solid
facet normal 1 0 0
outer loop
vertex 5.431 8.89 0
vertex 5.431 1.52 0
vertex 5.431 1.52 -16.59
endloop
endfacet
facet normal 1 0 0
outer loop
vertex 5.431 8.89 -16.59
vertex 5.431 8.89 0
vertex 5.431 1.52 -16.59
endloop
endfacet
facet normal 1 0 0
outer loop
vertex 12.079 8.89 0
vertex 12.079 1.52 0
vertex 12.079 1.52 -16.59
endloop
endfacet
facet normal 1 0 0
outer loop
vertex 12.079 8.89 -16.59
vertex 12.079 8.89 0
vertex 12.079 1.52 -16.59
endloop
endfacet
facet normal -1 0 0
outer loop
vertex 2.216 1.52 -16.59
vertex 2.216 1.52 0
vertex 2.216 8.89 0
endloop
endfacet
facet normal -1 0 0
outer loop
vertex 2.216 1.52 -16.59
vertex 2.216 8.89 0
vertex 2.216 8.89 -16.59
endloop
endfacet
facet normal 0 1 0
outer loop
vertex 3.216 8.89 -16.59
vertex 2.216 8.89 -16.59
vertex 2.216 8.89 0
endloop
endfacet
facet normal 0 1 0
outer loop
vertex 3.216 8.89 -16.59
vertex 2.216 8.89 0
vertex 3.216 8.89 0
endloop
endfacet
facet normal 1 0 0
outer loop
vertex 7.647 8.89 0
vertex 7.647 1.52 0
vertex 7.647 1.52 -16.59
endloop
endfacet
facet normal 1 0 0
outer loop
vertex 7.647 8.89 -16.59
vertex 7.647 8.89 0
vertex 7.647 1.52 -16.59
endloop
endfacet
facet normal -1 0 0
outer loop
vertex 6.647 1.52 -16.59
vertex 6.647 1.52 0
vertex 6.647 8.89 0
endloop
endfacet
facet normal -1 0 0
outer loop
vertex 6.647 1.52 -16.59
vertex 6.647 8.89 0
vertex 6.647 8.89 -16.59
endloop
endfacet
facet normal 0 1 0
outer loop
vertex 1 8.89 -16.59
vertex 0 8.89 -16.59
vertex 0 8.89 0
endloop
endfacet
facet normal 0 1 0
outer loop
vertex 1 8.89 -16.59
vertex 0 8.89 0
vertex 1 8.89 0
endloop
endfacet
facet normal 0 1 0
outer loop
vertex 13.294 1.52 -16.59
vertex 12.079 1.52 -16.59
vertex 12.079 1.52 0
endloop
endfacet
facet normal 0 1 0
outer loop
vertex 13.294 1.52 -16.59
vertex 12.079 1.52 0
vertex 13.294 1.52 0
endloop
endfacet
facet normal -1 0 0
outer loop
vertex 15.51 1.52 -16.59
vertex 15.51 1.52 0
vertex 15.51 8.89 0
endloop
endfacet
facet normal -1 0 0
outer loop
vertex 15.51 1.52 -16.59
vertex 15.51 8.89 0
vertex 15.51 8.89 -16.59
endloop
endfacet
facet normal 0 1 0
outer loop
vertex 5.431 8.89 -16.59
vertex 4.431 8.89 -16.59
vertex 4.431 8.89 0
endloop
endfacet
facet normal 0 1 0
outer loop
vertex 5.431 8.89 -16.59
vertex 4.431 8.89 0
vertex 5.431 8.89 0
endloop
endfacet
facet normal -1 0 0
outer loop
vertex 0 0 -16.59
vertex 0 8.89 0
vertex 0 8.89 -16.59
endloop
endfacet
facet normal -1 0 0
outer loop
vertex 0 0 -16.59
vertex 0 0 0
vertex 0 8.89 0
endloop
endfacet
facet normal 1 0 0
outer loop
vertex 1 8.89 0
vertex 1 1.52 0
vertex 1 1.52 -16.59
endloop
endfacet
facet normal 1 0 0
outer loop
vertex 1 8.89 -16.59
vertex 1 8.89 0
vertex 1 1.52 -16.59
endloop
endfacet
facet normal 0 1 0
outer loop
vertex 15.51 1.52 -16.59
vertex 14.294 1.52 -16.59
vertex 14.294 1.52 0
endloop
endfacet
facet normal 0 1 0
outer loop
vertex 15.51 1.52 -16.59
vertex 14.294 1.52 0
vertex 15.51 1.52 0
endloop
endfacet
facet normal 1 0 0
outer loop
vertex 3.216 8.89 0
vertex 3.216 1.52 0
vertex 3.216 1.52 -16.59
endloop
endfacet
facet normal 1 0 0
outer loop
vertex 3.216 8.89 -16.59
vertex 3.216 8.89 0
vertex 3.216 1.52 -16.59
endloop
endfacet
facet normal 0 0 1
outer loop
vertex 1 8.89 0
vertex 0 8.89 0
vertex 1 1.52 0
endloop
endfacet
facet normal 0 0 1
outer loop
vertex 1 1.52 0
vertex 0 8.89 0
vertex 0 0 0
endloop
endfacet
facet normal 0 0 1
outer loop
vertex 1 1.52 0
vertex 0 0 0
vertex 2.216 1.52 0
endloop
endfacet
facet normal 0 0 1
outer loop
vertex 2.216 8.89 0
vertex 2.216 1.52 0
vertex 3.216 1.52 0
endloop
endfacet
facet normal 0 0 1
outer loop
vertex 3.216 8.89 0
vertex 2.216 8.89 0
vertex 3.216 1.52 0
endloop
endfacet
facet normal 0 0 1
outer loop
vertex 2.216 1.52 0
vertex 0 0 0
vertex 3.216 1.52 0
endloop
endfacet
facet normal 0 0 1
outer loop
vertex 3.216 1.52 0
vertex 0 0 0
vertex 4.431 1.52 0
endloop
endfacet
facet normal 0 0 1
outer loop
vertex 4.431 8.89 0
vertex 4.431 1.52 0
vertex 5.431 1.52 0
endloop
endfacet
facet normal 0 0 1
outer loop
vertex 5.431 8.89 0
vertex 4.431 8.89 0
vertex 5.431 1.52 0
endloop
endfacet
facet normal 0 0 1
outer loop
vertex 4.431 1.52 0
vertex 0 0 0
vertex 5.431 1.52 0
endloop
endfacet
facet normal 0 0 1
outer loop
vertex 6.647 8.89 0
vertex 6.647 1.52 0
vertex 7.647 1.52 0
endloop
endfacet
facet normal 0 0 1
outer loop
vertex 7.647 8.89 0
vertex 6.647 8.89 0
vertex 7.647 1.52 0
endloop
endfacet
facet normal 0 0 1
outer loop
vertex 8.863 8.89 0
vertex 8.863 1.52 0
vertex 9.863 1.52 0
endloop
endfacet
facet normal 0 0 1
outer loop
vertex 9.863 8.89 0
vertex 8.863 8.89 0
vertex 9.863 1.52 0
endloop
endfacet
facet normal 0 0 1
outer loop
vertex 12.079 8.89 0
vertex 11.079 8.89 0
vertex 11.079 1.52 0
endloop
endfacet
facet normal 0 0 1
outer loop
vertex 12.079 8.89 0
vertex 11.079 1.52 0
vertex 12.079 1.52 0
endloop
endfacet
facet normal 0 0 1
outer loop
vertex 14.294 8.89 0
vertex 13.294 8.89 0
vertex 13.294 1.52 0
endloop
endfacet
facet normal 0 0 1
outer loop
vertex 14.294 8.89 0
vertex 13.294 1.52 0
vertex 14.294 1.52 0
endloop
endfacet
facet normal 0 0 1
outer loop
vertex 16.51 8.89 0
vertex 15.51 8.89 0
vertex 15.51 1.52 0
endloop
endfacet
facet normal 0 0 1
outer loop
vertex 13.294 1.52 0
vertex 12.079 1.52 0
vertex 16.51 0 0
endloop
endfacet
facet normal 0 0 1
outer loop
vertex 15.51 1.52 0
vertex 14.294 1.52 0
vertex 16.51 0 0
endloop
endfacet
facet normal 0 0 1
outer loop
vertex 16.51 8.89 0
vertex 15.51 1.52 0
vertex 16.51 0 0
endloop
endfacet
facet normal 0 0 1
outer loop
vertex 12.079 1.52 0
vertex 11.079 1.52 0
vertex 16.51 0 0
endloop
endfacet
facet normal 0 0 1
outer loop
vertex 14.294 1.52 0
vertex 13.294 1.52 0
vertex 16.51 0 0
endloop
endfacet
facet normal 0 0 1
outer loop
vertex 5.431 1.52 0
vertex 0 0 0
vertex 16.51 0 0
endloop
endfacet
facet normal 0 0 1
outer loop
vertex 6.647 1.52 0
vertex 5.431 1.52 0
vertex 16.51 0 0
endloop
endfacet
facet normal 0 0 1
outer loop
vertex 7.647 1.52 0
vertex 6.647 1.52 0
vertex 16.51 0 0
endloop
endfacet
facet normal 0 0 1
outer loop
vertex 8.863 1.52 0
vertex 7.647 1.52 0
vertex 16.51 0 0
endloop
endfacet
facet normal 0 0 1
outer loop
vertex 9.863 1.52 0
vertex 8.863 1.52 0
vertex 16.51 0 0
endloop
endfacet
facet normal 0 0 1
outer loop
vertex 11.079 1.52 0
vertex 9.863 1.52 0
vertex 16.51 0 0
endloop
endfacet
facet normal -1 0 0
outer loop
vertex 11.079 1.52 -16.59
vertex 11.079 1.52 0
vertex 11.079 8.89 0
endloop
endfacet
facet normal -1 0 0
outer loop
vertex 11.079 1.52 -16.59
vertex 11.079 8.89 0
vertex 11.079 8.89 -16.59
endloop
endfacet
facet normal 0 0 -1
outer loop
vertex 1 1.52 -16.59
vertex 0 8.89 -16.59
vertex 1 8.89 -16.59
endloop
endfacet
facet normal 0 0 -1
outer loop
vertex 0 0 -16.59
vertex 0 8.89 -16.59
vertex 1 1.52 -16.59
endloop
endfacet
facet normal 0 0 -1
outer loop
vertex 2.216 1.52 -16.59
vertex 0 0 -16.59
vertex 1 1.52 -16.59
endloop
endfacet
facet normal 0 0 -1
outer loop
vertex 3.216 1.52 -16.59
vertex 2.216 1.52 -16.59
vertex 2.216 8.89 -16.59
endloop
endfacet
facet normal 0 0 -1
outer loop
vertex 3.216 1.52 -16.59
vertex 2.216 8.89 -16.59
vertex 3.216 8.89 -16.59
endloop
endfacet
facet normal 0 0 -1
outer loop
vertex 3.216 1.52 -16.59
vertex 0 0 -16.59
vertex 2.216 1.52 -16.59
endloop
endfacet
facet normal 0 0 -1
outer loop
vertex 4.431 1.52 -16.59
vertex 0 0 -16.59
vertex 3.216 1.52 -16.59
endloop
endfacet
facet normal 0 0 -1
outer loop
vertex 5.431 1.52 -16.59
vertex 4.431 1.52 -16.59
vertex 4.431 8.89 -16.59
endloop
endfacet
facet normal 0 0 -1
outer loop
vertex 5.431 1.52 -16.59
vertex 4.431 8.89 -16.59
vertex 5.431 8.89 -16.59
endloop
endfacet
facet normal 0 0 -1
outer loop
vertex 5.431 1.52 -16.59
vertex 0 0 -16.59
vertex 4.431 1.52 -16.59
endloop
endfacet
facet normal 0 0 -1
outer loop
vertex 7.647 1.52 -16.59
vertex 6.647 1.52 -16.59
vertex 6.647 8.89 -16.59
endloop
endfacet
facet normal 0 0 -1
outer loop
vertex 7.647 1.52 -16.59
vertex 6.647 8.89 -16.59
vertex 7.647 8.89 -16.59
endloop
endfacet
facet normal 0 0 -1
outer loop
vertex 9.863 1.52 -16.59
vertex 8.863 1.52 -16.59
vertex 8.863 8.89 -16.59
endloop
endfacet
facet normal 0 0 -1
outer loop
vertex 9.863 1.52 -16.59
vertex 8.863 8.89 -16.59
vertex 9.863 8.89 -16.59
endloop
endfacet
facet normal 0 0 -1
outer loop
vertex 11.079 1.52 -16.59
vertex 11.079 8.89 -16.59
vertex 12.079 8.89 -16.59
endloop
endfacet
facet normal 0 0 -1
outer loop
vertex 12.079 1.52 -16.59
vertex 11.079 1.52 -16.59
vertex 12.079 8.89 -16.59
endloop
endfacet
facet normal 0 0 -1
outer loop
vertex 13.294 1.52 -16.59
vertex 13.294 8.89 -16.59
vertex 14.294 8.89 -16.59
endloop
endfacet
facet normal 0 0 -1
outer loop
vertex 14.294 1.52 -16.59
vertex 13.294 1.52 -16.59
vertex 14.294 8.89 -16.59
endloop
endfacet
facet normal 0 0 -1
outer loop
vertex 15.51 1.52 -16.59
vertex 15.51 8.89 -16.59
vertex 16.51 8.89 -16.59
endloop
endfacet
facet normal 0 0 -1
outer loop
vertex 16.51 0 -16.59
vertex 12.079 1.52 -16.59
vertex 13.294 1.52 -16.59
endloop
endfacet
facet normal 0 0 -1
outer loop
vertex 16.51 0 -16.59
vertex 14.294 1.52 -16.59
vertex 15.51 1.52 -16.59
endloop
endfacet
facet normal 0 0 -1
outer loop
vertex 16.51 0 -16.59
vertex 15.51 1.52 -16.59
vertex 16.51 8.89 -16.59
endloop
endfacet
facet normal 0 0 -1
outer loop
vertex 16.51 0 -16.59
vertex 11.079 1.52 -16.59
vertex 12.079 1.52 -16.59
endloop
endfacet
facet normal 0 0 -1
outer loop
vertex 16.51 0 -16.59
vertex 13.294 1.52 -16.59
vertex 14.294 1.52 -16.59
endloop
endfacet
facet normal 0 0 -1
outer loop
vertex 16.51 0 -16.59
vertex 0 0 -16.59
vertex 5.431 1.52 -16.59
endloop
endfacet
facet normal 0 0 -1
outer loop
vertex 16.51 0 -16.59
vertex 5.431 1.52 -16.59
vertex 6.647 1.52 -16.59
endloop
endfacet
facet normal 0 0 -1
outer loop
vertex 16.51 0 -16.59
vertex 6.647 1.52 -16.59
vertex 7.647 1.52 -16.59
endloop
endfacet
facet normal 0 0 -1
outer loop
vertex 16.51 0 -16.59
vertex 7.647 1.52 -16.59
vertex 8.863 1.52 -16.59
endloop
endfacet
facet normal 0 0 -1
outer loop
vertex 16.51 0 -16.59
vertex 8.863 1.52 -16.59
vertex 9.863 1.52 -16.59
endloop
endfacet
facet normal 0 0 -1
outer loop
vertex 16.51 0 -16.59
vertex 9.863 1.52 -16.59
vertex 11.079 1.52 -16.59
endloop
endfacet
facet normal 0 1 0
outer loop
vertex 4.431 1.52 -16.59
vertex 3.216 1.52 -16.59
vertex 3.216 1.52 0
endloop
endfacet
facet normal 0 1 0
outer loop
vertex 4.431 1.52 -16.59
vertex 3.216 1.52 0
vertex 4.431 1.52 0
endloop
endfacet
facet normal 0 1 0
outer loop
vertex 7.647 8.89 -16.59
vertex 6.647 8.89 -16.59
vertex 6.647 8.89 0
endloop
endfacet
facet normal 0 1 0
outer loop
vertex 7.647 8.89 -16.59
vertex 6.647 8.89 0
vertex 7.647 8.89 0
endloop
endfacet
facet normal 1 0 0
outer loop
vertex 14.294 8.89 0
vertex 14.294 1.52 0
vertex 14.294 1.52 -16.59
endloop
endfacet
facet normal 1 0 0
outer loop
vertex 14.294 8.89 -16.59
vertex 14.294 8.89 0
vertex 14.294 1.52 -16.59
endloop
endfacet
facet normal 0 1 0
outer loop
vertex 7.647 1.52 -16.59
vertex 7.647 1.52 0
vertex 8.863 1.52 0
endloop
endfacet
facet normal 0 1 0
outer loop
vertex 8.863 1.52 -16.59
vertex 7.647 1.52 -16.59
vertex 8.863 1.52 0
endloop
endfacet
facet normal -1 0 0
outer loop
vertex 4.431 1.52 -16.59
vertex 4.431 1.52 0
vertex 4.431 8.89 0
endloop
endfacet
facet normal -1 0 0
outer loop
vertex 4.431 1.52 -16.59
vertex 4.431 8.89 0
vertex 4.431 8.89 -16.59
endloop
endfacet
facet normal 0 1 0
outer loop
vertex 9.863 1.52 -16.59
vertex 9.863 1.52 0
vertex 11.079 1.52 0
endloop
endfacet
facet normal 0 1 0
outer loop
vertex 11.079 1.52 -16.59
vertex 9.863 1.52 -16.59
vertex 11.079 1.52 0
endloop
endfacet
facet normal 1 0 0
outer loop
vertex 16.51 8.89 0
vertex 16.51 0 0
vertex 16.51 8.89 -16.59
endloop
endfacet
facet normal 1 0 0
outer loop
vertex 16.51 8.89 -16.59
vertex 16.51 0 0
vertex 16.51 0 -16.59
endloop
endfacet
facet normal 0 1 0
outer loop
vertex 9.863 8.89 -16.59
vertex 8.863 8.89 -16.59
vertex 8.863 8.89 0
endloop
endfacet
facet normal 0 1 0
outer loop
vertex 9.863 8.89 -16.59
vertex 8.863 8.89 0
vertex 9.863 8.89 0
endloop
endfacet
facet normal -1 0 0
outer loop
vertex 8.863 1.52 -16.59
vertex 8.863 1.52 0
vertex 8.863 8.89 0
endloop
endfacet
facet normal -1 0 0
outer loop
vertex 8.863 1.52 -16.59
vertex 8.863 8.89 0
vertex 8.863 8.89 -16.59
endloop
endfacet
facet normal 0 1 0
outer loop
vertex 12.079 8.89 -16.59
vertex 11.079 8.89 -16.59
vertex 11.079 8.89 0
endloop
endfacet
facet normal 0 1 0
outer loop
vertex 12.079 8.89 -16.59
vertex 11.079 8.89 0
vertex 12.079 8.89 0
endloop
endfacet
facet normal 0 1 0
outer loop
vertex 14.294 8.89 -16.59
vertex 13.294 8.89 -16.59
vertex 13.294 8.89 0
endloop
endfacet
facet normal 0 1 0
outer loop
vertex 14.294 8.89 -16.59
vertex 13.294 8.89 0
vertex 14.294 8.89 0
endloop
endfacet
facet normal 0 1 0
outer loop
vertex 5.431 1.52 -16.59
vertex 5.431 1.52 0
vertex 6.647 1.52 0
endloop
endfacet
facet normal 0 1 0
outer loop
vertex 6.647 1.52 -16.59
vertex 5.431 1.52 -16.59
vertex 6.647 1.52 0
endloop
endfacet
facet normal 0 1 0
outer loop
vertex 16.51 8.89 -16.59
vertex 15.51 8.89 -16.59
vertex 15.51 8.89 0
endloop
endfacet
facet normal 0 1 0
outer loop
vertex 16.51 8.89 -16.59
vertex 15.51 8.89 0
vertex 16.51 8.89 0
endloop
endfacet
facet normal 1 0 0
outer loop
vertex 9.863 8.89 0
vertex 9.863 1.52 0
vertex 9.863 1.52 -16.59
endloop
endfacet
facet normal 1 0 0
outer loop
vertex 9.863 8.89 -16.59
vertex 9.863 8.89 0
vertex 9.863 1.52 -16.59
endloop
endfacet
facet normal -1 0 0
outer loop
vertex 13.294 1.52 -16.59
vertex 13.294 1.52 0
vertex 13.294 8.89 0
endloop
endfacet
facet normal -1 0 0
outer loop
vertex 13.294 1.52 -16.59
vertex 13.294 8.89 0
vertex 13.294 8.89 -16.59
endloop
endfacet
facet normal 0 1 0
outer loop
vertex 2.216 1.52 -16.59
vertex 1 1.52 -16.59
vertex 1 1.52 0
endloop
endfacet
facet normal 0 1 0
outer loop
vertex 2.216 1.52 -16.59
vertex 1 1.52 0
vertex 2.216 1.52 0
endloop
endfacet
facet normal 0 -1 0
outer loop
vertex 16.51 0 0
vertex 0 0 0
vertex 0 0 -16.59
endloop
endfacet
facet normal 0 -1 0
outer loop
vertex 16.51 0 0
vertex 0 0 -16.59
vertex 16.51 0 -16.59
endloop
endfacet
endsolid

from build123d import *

# Parameters (mm, degrees)
SKETCH1_W           = 16.51
SKETCH1_H           = 16.59
BOSS_EXTRUDE1_DEPTH = 1.52
SKETCH2_W           = 1
SKETCH2_H           = 16.59
BOSS_EXTRUDE2_DEPTH = 7.37


with BuildPart() as part:
    # Sketch1 → Boss-Extrude1 (new body)
    with BuildSketch(Plane(origin=(0, 0, 0), x_dir=(1, 0, 0), z_dir=(0, 1, 0))):
        with Locations((8.255, 8.295)):
            Rectangle(SKETCH1_W, SKETCH1_H)
    extrude(amount=BOSS_EXTRUDE1_DEPTH)

    # Sketch2 → Boss-Extrude2 (add)
    with BuildSketch(Plane(origin=(0, 1.52, 0), x_dir=(1, 0, 0), z_dir=(0, 1, 0))):
        with Locations((0.5, 8.295)):
            Rectangle(SKETCH2_W, SKETCH2_H)
        with Locations((2.715714286, 8.295)):
            Rectangle(SKETCH2_W, SKETCH2_H)
        with Locations((4.931428571, 8.295)):
            Rectangle(SKETCH2_W, SKETCH2_H)
        with Locations((7.147142857, 8.295)):
            Rectangle(SKETCH2_W, SKETCH2_H)
        with Locations((9.362857143, 8.295)):
            Rectangle(SKETCH2_W, SKETCH2_H)
        with Locations((11.578571429, 8.295)):
            Rectangle(SKETCH2_W, SKETCH2_H)
        with Locations((13.794285714, 8.295)):
            Rectangle(SKETCH2_W, SKETCH2_H)
        with Locations((16.01, 8.295)):
            Rectangle(SKETCH2_W, SKETCH2_H)
    extrude(amount=BOSS_EXTRUDE2_DEPTH)


solid = part.part
